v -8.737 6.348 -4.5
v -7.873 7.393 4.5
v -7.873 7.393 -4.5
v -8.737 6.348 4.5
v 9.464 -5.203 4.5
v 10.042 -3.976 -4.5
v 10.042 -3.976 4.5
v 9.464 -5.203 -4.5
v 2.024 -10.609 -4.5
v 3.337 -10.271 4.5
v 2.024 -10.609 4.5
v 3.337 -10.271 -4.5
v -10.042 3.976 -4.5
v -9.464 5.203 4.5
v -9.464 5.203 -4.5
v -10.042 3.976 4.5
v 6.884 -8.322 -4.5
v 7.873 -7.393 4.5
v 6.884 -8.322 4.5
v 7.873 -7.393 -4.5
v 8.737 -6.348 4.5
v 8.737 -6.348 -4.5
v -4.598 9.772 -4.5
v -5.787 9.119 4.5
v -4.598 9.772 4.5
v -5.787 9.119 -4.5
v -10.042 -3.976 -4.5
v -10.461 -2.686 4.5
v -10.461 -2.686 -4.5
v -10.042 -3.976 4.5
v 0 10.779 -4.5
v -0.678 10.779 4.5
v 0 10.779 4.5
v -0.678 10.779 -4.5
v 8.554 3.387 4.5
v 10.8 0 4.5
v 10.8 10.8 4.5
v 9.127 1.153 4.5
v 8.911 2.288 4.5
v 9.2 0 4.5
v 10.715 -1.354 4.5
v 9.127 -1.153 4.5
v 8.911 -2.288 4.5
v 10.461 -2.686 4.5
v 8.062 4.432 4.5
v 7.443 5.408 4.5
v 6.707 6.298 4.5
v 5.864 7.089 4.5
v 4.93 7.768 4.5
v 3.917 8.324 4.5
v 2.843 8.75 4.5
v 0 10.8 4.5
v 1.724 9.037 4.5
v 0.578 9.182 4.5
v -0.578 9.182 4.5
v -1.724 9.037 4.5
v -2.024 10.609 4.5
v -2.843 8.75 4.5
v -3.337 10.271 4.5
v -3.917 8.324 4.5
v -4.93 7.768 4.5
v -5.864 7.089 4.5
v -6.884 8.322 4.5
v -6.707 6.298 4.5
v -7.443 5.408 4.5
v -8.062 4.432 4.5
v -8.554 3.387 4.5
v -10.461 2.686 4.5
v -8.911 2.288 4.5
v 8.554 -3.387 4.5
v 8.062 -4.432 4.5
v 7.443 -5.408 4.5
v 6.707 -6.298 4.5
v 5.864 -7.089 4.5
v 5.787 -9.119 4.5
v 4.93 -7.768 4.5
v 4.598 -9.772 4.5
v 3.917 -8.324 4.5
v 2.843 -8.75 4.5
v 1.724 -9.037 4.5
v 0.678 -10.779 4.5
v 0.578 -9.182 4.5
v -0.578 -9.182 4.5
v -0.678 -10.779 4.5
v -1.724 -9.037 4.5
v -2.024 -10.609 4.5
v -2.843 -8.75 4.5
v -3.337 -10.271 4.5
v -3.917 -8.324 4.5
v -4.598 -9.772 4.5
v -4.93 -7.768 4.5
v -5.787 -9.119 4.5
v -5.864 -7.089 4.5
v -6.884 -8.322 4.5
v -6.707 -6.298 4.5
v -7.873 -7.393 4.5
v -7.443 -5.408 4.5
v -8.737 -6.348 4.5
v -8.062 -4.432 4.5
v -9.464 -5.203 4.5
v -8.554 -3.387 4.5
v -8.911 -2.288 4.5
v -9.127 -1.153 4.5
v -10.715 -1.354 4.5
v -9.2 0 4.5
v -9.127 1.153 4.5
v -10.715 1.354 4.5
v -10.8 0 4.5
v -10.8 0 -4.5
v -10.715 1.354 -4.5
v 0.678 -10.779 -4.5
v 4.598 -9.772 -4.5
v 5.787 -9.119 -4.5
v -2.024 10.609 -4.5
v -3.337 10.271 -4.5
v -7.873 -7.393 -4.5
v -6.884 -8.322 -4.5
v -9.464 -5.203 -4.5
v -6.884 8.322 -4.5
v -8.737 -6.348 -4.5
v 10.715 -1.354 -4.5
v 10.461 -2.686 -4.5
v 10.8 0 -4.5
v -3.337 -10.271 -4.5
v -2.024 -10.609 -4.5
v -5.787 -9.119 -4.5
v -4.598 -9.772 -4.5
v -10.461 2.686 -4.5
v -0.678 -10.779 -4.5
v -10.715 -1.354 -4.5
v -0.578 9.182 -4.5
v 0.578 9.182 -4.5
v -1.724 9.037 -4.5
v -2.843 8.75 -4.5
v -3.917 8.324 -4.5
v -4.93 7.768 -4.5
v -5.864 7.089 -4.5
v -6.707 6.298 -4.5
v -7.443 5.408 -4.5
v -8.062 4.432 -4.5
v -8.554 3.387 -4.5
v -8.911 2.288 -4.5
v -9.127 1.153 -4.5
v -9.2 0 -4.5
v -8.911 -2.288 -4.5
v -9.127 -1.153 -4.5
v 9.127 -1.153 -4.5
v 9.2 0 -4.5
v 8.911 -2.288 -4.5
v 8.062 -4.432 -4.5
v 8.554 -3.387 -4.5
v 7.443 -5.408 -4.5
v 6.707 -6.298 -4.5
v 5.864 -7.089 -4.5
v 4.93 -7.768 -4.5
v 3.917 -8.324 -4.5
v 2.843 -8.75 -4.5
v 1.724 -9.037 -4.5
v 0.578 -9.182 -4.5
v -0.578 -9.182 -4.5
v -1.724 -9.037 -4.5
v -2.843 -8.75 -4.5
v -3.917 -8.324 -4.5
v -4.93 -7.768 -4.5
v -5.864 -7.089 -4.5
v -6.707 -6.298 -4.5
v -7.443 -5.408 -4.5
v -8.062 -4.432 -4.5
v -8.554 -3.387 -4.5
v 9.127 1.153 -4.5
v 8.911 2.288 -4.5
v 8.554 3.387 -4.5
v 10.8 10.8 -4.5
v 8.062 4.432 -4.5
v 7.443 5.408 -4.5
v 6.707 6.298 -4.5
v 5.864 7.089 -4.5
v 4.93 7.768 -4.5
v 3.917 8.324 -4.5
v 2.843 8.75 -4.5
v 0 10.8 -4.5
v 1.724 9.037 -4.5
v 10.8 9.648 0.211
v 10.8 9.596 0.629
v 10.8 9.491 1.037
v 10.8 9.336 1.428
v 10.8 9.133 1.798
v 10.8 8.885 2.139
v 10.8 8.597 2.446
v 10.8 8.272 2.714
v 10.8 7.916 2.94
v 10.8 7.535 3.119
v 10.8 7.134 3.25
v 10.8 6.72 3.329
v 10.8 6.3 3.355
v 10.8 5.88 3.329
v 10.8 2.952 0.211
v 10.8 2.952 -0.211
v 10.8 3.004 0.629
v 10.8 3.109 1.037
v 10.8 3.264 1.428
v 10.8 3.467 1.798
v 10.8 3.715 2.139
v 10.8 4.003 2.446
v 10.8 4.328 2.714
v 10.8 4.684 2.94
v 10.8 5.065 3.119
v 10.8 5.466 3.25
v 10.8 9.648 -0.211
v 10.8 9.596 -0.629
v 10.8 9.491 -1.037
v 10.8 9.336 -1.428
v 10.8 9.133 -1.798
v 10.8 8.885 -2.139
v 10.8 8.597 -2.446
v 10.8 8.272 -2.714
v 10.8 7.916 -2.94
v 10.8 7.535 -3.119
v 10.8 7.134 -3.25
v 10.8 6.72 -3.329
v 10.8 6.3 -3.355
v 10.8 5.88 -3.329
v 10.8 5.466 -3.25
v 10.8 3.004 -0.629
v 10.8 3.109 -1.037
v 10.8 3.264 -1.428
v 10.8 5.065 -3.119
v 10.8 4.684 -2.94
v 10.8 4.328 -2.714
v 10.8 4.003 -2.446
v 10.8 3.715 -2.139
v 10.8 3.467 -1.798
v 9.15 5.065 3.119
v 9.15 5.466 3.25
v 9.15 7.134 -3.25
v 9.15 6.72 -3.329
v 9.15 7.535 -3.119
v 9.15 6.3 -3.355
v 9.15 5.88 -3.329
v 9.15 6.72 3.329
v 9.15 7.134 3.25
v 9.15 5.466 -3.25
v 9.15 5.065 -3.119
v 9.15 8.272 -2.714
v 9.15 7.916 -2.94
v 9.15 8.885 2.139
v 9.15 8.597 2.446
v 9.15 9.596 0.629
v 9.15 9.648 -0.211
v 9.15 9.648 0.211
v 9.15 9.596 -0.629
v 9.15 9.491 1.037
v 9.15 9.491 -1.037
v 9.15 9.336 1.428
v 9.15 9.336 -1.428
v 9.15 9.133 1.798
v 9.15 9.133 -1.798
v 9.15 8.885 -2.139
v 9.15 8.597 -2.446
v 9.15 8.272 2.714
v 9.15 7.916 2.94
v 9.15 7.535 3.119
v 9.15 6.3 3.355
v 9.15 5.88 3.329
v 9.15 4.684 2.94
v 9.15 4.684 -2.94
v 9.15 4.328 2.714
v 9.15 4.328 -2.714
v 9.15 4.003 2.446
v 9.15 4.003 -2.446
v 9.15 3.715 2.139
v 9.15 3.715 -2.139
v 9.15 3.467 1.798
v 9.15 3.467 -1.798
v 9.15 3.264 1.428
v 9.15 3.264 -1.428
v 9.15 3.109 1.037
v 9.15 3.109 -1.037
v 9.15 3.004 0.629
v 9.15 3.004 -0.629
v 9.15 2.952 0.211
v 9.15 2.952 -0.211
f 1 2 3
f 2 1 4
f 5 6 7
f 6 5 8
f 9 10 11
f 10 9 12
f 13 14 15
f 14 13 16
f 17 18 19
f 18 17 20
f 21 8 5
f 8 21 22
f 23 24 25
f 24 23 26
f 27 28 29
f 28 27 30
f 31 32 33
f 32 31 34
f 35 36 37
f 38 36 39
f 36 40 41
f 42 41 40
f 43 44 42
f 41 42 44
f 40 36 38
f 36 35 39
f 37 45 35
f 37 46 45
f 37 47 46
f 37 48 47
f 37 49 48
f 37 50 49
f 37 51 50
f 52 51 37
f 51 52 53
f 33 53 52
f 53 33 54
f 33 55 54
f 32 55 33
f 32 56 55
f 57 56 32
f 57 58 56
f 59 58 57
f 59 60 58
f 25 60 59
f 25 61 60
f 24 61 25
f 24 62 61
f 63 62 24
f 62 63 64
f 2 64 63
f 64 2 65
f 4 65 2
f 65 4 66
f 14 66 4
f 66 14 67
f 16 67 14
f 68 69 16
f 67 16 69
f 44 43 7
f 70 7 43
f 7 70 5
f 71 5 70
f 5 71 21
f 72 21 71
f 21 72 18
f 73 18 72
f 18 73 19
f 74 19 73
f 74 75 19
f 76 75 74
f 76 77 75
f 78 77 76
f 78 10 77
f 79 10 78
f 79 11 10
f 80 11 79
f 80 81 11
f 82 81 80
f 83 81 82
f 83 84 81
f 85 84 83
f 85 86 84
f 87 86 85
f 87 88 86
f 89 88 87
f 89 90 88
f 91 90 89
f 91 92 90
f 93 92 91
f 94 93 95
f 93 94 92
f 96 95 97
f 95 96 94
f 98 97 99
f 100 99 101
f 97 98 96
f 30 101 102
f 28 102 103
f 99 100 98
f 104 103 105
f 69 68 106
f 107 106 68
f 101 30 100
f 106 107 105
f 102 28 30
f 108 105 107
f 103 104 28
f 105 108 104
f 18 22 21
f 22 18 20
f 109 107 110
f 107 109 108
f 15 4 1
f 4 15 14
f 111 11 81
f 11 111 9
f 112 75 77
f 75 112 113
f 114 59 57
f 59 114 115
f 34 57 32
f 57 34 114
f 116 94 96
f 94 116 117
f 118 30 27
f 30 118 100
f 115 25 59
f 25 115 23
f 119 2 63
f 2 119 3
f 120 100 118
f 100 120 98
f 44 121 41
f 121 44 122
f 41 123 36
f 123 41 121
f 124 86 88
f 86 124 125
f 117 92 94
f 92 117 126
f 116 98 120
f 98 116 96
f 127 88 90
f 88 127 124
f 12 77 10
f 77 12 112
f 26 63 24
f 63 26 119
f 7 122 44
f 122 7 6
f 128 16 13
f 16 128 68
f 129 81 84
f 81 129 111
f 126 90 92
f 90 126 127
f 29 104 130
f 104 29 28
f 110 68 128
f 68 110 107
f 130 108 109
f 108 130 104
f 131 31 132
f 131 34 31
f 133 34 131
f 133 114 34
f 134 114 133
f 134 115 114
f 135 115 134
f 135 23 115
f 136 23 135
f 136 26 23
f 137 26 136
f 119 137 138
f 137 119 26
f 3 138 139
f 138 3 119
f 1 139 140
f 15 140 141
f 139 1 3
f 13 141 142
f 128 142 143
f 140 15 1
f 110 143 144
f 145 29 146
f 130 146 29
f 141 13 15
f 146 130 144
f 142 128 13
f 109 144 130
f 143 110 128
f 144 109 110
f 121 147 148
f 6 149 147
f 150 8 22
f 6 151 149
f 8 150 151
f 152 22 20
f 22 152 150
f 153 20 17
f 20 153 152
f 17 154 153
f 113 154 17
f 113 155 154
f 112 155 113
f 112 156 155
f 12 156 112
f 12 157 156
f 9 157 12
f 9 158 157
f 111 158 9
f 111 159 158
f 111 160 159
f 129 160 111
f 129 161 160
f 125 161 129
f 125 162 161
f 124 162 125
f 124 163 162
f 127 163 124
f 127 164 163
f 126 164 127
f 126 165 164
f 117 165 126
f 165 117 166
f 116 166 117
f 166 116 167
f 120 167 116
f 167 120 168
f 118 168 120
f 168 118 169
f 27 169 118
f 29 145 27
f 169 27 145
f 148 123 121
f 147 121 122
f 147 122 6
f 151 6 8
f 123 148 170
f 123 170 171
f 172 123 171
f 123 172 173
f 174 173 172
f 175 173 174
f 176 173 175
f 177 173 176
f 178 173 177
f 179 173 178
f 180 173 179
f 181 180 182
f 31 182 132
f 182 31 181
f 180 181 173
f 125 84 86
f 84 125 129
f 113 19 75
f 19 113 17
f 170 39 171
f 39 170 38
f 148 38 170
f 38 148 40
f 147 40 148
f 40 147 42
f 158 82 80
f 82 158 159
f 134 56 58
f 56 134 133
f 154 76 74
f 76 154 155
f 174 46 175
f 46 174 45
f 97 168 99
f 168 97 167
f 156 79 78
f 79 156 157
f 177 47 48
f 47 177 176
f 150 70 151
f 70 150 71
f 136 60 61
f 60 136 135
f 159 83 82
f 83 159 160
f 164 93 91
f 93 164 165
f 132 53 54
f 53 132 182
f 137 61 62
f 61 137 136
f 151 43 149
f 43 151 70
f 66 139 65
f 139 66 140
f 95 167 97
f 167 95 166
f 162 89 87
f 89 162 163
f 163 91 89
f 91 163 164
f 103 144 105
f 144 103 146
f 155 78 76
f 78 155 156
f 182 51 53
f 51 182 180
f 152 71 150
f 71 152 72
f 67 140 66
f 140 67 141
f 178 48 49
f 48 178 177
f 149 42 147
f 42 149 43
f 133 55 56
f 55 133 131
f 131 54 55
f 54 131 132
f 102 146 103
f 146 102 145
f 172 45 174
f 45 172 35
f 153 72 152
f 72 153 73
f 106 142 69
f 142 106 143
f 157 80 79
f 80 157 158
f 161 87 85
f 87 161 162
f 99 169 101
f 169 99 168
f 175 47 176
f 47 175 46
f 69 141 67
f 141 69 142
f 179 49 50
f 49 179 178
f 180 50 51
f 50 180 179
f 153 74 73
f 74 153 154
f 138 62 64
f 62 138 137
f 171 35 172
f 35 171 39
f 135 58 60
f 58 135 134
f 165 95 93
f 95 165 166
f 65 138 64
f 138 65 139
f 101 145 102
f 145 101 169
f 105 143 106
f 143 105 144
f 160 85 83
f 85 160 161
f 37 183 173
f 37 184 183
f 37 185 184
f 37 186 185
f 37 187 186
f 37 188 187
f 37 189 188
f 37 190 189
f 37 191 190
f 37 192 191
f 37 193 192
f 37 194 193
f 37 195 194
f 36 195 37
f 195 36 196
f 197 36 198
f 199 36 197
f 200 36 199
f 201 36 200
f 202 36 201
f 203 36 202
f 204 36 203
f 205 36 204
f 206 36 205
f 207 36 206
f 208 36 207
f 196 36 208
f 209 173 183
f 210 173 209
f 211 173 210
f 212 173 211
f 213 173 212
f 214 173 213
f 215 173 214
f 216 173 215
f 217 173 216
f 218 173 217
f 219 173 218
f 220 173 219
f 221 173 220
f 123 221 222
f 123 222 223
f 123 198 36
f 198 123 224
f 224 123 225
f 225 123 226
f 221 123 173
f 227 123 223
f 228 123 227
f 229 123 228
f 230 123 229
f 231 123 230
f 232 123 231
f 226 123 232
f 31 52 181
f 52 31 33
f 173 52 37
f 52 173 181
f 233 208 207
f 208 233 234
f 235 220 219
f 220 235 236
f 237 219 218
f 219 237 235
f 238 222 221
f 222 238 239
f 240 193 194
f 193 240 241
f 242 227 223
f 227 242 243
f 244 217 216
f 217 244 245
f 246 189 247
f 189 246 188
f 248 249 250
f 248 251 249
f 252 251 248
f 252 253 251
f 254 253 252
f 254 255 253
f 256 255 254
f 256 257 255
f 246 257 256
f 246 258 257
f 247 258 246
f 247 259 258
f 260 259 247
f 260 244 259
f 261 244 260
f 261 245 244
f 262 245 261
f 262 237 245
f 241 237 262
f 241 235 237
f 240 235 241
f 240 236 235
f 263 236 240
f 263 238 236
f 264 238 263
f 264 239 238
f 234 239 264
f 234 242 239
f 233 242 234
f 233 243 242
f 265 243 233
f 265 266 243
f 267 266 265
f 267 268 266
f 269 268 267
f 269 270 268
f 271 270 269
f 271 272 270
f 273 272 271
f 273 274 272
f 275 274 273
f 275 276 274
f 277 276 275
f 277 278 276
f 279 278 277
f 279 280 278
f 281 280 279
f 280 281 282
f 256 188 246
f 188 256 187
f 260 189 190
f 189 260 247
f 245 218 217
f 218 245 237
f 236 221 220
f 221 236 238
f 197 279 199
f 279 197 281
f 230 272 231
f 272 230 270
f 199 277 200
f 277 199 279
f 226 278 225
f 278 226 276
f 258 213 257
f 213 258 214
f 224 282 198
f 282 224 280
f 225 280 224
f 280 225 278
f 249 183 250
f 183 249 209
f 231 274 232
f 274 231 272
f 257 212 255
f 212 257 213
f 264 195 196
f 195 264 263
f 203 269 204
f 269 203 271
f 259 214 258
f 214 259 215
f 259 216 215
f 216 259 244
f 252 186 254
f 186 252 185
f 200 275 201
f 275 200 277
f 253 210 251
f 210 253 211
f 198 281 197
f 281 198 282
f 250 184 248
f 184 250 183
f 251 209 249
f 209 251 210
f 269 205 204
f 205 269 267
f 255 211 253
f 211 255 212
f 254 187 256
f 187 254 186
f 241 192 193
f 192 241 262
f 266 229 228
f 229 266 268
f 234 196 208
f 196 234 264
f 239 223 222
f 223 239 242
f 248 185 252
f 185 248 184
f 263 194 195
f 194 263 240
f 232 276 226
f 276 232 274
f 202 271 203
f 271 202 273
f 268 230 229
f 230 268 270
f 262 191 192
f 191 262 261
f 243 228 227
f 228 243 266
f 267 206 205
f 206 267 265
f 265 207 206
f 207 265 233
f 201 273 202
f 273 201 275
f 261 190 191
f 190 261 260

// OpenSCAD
$fn = 50;
ring_inner=9.2;
ring_width=9;
ring_thickness=1.6;
ring_outer=ring_inner+ring_thickness;
ring_block = ring_outer;
magnet_radius = 3.355;
magnet_height= 1.65;
magnet_margin = (ring_width-magnet_radius*2)/2;




module ring() {
    difference() {
        cylinder(h = ring_width,r = ring_outer, center = true);
        cylinder(h = ring_width*1.4,r = ring_inner, center = true);
        
    };
};

module block(){
    difference() {
        translate([0,0,ring_width/2*-1]) 
            cube([ring_block, ring_block, ring_width]);
        cylinder(h = ring_width*1.4,r = ring_inner, center = true);

    };
};


     
module ringBlock(){
    union(){
        ring();
        block();
    };
};


module finalRing(){
    difference(){
        ringBlock();
        rotate([0,90,0])
            translate ([0,ring_outer-magnet_radius-magnet_margin,ring_outer-magnet_height]) 
                cylinder(h = magnet_height+1, r = magnet_radius);
    };
};


finalRing();
